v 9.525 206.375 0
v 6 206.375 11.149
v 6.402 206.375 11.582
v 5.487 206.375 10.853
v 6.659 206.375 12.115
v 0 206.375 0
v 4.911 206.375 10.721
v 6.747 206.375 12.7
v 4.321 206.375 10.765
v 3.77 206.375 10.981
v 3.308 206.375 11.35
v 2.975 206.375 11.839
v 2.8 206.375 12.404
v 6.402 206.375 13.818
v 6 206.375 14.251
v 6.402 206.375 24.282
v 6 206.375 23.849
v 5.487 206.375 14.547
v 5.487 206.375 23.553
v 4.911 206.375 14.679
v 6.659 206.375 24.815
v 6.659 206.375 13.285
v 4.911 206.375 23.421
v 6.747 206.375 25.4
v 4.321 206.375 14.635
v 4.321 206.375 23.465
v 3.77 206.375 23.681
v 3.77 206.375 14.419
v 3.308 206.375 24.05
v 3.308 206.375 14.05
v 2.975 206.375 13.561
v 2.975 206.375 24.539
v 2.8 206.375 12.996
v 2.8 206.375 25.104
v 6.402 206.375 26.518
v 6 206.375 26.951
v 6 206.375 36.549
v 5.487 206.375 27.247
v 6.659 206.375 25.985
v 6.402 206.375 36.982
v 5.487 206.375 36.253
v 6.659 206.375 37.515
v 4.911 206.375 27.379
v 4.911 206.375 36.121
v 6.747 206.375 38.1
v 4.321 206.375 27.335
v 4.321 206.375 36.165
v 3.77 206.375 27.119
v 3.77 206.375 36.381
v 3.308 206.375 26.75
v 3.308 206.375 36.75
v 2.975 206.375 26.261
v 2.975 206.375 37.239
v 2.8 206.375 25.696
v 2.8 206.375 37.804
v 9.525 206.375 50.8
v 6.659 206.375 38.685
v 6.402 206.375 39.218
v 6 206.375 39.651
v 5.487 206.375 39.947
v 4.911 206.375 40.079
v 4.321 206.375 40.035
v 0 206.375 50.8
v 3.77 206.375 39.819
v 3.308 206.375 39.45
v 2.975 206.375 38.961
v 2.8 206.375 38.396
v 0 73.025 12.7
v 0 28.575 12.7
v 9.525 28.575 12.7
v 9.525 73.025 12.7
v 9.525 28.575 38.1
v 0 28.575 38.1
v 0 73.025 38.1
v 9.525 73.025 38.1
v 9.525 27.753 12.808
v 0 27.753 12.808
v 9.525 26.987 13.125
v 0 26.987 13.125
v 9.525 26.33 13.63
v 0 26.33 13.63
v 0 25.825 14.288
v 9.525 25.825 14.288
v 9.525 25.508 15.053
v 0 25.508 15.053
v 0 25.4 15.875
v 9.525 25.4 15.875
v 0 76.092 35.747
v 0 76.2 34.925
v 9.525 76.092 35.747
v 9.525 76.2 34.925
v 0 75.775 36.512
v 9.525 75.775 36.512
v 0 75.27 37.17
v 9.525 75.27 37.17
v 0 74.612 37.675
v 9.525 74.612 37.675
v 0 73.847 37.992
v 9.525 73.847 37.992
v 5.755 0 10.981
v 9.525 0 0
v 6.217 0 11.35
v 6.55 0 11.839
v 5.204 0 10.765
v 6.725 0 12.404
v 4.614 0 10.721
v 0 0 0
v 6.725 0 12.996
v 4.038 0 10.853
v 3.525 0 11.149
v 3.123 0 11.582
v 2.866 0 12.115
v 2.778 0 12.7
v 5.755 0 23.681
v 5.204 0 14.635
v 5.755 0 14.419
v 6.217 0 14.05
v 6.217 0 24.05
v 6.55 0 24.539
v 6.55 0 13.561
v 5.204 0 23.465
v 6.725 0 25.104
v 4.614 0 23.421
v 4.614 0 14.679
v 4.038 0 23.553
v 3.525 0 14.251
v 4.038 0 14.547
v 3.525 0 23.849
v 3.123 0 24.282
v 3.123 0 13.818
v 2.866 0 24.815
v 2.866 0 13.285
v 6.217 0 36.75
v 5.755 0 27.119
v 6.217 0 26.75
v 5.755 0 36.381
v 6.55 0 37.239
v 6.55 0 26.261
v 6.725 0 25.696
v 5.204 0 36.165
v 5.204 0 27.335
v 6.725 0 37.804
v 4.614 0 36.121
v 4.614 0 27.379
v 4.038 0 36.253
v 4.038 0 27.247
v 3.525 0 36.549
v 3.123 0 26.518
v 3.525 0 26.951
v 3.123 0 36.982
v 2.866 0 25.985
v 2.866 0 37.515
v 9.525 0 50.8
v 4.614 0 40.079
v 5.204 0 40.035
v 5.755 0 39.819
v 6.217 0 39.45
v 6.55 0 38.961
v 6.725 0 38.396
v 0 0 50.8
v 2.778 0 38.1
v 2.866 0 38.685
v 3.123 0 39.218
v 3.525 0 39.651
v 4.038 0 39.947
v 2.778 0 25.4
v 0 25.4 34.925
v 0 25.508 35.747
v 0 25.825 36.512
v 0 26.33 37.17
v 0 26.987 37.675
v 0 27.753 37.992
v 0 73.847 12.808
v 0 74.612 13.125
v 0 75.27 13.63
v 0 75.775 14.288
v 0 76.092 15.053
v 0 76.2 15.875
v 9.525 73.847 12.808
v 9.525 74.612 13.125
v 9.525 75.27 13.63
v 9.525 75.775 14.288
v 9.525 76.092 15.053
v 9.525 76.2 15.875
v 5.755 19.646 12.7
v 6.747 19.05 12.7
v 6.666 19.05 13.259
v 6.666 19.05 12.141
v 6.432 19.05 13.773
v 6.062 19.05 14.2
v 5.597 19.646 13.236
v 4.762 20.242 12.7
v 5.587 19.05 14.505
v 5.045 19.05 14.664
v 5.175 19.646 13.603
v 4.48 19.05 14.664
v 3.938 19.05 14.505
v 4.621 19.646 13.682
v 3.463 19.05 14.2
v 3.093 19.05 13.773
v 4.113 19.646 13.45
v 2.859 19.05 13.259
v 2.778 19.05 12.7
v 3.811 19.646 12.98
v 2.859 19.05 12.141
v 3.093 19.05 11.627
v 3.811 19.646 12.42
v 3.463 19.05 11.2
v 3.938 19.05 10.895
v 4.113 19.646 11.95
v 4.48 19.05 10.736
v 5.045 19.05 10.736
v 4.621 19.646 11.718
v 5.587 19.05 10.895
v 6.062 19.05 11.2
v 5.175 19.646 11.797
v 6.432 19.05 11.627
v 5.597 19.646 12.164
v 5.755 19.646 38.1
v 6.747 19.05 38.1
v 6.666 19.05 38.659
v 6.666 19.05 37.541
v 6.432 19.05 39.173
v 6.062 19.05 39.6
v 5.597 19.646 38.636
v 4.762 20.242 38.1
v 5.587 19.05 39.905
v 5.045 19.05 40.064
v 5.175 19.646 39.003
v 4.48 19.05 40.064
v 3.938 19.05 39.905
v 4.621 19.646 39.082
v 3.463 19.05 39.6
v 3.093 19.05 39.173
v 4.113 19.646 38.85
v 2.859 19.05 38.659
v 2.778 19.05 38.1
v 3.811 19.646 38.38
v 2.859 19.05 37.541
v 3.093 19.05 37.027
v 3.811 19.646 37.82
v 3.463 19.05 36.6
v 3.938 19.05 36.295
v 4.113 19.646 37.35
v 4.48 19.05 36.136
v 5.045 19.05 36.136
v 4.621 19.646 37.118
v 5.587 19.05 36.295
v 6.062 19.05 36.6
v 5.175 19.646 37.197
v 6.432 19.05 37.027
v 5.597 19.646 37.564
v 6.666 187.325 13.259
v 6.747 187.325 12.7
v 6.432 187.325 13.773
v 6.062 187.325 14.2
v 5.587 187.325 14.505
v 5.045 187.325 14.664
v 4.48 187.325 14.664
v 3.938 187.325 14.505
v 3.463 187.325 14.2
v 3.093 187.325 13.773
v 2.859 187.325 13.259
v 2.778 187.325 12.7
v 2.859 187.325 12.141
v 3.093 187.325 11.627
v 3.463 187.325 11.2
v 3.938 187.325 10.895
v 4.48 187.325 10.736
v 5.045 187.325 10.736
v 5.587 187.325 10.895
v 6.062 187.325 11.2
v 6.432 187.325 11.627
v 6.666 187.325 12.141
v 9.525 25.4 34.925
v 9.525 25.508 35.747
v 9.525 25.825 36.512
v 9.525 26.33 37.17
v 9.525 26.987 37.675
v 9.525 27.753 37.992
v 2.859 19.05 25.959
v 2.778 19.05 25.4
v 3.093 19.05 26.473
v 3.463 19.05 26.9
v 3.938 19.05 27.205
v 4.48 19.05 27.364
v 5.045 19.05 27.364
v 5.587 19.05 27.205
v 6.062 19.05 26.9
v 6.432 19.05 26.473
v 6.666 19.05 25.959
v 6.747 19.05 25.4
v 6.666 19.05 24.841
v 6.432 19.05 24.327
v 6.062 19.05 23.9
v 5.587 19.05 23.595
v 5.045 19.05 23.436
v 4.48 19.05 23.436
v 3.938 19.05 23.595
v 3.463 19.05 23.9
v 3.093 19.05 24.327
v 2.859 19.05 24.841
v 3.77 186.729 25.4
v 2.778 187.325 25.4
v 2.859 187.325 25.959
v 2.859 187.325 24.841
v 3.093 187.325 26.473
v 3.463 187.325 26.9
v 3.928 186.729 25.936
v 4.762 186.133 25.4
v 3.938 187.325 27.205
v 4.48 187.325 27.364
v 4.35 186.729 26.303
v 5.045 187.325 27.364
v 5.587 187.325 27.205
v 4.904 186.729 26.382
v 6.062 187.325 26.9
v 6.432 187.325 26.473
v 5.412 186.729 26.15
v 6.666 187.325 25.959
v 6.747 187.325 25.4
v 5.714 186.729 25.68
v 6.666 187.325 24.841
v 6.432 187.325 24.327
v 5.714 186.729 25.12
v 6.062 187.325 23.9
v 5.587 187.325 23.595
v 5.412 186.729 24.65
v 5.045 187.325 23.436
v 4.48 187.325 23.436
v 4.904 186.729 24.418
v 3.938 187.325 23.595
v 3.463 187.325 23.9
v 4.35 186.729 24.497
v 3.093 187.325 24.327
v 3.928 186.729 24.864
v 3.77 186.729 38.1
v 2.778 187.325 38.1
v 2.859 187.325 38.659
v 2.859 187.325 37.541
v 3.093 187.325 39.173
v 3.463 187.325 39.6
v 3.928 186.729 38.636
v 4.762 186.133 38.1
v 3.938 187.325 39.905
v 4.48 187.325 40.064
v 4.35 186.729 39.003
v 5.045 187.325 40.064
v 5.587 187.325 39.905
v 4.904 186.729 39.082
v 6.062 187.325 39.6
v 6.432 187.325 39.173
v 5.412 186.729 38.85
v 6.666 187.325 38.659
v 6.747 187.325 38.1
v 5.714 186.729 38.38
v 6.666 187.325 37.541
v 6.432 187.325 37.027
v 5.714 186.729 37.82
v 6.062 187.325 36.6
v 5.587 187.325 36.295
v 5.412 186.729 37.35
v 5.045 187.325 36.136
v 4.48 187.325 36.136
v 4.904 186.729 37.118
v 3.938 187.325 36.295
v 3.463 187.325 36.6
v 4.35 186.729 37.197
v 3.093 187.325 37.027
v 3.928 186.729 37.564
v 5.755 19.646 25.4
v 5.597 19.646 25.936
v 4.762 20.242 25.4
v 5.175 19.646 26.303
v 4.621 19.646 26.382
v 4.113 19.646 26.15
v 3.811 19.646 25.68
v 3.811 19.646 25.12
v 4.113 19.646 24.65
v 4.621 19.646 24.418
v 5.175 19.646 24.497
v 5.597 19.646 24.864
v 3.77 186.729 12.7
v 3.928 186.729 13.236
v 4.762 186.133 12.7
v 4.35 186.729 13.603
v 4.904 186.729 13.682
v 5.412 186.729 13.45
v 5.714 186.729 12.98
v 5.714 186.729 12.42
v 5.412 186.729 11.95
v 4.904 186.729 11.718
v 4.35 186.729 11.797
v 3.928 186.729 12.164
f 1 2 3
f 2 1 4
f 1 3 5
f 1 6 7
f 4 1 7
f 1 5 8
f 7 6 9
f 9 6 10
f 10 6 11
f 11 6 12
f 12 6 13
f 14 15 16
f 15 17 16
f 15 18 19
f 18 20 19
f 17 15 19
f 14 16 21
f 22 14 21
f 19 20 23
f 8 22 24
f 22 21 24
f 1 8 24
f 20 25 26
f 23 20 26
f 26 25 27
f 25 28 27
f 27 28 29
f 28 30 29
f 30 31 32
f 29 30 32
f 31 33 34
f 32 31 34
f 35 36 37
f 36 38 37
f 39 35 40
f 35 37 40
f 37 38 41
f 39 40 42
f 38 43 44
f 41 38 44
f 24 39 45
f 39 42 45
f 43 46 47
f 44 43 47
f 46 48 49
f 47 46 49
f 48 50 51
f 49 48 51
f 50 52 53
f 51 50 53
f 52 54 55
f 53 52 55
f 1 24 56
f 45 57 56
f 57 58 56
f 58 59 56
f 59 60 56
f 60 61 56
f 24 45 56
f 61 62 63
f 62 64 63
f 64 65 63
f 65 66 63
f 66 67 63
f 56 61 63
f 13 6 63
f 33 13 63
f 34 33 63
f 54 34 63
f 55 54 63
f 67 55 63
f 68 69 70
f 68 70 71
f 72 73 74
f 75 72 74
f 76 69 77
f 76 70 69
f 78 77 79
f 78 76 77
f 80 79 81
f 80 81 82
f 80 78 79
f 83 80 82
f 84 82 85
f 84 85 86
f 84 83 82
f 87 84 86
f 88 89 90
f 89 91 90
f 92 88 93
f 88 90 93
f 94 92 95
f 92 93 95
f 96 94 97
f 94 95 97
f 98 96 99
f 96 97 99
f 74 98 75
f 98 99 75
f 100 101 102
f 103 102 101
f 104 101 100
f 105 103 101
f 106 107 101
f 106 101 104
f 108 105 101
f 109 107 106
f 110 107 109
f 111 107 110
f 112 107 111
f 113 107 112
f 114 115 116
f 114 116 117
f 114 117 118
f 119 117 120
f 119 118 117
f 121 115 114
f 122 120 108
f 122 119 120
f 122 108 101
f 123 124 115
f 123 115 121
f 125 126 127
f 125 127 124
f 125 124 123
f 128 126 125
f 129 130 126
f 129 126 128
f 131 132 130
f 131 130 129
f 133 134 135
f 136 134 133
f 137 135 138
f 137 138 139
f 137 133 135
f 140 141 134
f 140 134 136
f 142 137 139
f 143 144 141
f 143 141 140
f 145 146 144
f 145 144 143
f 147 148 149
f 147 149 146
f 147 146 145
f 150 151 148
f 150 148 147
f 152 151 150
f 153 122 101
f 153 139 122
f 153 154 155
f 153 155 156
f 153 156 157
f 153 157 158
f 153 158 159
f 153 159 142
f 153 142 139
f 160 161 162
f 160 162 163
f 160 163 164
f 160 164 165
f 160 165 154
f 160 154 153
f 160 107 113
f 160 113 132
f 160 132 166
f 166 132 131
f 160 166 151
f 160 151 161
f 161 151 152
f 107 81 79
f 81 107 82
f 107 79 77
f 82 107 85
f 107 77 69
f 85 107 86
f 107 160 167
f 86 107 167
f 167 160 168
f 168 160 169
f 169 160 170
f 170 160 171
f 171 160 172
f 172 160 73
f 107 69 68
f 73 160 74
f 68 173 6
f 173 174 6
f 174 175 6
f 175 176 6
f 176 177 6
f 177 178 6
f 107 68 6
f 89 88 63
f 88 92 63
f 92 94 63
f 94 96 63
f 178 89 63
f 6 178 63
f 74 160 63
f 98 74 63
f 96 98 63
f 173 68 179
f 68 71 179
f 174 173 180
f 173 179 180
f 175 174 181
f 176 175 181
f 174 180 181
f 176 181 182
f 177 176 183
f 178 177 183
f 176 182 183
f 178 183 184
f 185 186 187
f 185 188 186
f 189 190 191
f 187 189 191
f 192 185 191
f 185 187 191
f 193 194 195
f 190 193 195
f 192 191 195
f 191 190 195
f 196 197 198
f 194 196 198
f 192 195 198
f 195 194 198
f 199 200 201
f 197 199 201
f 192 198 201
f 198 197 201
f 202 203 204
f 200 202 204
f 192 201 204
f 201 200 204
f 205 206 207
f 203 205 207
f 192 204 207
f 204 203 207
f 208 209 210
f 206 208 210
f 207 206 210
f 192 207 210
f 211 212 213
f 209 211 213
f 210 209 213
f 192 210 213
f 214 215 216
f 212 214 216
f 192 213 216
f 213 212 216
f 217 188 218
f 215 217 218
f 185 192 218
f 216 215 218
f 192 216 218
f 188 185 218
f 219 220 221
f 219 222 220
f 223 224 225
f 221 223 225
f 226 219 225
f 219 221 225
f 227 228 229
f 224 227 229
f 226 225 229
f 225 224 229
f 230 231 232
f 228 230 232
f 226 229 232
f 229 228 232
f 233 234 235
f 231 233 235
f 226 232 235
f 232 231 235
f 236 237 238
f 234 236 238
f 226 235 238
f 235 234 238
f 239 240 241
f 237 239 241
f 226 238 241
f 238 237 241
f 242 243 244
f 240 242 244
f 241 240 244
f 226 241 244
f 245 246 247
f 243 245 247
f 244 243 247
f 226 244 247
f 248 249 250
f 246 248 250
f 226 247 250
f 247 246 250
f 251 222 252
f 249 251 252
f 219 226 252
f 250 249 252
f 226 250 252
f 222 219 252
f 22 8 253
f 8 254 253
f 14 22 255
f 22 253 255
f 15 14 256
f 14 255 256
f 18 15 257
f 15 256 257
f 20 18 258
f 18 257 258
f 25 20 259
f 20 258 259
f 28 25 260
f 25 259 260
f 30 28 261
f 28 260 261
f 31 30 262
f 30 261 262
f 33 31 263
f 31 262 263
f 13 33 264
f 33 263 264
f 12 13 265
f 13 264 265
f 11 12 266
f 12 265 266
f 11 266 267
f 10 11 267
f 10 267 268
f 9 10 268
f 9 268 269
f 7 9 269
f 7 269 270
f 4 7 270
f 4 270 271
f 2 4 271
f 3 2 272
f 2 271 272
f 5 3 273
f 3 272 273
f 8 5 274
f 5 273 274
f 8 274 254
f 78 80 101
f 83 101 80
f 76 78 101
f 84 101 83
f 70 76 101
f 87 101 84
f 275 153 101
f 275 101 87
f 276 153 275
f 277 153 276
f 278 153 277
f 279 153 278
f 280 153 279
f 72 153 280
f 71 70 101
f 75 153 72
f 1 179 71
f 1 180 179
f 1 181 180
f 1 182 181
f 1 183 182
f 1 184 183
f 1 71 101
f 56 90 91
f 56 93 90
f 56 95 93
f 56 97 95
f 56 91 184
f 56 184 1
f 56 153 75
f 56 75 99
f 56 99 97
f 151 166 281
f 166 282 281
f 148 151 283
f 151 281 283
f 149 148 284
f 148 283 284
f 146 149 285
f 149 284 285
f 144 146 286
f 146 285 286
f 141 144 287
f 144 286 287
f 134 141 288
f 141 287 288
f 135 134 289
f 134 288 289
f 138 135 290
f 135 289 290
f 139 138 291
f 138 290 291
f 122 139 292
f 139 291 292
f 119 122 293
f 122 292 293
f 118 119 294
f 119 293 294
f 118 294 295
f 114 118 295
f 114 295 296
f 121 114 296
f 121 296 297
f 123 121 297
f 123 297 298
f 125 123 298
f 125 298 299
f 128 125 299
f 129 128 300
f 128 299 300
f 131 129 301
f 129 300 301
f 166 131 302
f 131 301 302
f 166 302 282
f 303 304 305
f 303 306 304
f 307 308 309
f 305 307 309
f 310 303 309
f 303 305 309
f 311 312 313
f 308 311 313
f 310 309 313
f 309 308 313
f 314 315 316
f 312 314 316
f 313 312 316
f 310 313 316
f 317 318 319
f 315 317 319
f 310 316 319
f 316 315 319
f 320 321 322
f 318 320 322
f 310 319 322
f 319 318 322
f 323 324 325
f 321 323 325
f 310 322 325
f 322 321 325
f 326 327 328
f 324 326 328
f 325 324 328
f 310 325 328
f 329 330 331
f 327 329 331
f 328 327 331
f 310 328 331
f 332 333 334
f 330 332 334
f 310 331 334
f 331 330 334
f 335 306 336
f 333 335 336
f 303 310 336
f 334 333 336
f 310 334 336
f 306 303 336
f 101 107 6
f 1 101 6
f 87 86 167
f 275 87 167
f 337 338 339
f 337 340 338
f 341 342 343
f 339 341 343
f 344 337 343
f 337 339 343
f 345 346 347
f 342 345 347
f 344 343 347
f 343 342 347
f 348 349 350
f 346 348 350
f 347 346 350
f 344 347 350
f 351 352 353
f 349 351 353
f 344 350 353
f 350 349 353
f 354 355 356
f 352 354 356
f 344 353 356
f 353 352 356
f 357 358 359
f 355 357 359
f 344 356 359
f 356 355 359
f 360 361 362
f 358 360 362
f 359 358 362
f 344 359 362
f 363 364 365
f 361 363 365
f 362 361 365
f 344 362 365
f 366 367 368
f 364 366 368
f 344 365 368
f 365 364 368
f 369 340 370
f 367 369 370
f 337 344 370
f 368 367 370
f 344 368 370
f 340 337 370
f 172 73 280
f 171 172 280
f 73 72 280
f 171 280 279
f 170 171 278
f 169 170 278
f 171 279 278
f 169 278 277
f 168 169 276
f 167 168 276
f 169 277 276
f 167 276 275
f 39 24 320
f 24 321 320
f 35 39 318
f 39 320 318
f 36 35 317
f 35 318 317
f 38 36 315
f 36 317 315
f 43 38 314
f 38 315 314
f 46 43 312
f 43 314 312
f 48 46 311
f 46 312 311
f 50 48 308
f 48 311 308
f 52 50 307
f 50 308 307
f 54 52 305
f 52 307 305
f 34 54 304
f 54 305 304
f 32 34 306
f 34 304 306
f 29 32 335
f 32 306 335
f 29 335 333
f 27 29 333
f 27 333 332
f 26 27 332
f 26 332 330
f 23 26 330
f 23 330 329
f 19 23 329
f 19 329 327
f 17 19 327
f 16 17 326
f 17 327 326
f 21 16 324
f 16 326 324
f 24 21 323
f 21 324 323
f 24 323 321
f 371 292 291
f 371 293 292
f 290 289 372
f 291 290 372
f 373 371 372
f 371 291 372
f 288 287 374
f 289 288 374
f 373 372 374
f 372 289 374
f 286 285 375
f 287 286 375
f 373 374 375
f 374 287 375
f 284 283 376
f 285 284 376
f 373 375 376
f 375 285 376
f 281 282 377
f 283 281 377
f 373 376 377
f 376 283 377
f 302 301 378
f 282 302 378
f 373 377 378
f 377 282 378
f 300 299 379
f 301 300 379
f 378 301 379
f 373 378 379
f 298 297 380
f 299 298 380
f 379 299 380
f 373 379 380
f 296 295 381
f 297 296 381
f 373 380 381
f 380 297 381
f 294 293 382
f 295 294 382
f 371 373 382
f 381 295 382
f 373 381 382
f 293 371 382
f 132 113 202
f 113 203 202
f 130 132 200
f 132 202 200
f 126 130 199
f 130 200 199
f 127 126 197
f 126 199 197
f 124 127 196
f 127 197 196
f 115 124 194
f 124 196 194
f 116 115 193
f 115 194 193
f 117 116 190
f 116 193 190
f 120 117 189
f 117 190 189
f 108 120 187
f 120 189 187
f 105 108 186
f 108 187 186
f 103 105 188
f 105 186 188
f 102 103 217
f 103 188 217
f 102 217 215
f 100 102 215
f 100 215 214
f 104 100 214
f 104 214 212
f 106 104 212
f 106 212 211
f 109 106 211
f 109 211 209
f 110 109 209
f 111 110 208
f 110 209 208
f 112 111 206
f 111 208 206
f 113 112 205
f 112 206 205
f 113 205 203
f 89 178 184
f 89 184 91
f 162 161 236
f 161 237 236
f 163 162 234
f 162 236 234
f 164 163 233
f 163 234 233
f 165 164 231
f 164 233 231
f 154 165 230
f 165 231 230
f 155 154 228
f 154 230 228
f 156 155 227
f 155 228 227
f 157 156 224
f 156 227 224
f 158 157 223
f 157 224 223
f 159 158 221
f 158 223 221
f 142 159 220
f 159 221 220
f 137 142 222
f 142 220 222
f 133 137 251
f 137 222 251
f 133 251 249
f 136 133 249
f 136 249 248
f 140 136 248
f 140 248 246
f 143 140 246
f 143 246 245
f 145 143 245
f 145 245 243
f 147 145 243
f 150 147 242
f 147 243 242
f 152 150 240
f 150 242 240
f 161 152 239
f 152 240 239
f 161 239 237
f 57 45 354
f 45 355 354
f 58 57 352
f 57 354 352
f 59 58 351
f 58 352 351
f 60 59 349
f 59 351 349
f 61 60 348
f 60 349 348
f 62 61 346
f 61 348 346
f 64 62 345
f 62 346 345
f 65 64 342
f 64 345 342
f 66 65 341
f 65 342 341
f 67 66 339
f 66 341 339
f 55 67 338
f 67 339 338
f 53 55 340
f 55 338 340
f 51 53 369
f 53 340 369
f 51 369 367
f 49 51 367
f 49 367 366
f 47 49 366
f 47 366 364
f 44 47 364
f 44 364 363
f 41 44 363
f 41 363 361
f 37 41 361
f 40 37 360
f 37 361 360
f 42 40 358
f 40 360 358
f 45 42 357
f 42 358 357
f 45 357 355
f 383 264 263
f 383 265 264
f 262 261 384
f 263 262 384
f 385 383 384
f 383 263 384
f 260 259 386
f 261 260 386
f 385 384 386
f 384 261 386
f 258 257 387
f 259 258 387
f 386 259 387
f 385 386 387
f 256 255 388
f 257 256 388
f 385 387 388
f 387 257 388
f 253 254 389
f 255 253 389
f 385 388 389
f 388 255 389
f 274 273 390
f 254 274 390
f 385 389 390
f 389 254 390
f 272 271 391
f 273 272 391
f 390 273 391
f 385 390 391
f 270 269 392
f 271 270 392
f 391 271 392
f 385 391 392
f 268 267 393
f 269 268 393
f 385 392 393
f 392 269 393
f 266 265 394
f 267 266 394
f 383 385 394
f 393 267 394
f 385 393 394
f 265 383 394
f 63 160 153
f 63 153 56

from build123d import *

# Parameters (mm, degrees)
F0_W     = 206.375
F0_H     = 50.8
F0_W_2   = 50.8
F0_H_2   = 25.4
F1_DEPTH = 9.525
F3_D     = 3.96875
F3_DEPTH = 19.05
F3_TIP   = 1.1923327909
F5_D     = 3.96875
F5_DEPTH = 19.05
F5_TIP   = 1.1923327909
F6_R     = 3.175


with BuildPart() as f1:
    # F0 (on Right) → F1 (new body)
    with BuildSketch(Plane.YZ):
        with Locations((103.1875, 25.4)):
            Rectangle(F0_W, F0_H)
        with Locations((50.8, 25.4)):
            Rectangle(F0_W_2, F0_H_2, mode=Mode.SUBTRACT)
    extrude(amount=F1_DEPTH)

    # F3
    with Locations(Plane(origin=(0, 206.375, 0), x_dir=(-1, 0, 0), z_dir=(0, 1, 0))):
        with Locations((-4.7625, 38.1), (-4.7625, 25.4), (-4.7625, 12.7)):
            Hole(F3_D / 2, depth=F3_DEPTH)
            with Locations((0, 0, -(F3_DEPTH + F3_TIP / 2))):  # 118° drill point
                Cone(0, F3_D / 2, F3_TIP, mode=Mode.SUBTRACT)

    # F5
    with Locations(Plane.XZ):
        with Locations((4.7625, 38.1), (4.7625, 25.4), (4.7625, 12.7)):
            Hole(F5_D / 2, depth=F5_DEPTH)
            with Locations((0, 0, -(F5_DEPTH + F5_TIP / 2))):  # 118° drill point
                Cone(0, F5_D / 2, F5_TIP, mode=Mode.SUBTRACT)

    # F6
    f6_edges = [f1.edges().sort_by_distance(p)[0] for p in [
        (4.7625, 76.2, 38.1),
        (4.7625, 25.4, 38.1),
        (4.7625, 25.4, 12.7),
        (4.7625, 76.2, 12.7),
    ]]
    fillet(f6_edges, radius=F6_R)


solid = f1.part
